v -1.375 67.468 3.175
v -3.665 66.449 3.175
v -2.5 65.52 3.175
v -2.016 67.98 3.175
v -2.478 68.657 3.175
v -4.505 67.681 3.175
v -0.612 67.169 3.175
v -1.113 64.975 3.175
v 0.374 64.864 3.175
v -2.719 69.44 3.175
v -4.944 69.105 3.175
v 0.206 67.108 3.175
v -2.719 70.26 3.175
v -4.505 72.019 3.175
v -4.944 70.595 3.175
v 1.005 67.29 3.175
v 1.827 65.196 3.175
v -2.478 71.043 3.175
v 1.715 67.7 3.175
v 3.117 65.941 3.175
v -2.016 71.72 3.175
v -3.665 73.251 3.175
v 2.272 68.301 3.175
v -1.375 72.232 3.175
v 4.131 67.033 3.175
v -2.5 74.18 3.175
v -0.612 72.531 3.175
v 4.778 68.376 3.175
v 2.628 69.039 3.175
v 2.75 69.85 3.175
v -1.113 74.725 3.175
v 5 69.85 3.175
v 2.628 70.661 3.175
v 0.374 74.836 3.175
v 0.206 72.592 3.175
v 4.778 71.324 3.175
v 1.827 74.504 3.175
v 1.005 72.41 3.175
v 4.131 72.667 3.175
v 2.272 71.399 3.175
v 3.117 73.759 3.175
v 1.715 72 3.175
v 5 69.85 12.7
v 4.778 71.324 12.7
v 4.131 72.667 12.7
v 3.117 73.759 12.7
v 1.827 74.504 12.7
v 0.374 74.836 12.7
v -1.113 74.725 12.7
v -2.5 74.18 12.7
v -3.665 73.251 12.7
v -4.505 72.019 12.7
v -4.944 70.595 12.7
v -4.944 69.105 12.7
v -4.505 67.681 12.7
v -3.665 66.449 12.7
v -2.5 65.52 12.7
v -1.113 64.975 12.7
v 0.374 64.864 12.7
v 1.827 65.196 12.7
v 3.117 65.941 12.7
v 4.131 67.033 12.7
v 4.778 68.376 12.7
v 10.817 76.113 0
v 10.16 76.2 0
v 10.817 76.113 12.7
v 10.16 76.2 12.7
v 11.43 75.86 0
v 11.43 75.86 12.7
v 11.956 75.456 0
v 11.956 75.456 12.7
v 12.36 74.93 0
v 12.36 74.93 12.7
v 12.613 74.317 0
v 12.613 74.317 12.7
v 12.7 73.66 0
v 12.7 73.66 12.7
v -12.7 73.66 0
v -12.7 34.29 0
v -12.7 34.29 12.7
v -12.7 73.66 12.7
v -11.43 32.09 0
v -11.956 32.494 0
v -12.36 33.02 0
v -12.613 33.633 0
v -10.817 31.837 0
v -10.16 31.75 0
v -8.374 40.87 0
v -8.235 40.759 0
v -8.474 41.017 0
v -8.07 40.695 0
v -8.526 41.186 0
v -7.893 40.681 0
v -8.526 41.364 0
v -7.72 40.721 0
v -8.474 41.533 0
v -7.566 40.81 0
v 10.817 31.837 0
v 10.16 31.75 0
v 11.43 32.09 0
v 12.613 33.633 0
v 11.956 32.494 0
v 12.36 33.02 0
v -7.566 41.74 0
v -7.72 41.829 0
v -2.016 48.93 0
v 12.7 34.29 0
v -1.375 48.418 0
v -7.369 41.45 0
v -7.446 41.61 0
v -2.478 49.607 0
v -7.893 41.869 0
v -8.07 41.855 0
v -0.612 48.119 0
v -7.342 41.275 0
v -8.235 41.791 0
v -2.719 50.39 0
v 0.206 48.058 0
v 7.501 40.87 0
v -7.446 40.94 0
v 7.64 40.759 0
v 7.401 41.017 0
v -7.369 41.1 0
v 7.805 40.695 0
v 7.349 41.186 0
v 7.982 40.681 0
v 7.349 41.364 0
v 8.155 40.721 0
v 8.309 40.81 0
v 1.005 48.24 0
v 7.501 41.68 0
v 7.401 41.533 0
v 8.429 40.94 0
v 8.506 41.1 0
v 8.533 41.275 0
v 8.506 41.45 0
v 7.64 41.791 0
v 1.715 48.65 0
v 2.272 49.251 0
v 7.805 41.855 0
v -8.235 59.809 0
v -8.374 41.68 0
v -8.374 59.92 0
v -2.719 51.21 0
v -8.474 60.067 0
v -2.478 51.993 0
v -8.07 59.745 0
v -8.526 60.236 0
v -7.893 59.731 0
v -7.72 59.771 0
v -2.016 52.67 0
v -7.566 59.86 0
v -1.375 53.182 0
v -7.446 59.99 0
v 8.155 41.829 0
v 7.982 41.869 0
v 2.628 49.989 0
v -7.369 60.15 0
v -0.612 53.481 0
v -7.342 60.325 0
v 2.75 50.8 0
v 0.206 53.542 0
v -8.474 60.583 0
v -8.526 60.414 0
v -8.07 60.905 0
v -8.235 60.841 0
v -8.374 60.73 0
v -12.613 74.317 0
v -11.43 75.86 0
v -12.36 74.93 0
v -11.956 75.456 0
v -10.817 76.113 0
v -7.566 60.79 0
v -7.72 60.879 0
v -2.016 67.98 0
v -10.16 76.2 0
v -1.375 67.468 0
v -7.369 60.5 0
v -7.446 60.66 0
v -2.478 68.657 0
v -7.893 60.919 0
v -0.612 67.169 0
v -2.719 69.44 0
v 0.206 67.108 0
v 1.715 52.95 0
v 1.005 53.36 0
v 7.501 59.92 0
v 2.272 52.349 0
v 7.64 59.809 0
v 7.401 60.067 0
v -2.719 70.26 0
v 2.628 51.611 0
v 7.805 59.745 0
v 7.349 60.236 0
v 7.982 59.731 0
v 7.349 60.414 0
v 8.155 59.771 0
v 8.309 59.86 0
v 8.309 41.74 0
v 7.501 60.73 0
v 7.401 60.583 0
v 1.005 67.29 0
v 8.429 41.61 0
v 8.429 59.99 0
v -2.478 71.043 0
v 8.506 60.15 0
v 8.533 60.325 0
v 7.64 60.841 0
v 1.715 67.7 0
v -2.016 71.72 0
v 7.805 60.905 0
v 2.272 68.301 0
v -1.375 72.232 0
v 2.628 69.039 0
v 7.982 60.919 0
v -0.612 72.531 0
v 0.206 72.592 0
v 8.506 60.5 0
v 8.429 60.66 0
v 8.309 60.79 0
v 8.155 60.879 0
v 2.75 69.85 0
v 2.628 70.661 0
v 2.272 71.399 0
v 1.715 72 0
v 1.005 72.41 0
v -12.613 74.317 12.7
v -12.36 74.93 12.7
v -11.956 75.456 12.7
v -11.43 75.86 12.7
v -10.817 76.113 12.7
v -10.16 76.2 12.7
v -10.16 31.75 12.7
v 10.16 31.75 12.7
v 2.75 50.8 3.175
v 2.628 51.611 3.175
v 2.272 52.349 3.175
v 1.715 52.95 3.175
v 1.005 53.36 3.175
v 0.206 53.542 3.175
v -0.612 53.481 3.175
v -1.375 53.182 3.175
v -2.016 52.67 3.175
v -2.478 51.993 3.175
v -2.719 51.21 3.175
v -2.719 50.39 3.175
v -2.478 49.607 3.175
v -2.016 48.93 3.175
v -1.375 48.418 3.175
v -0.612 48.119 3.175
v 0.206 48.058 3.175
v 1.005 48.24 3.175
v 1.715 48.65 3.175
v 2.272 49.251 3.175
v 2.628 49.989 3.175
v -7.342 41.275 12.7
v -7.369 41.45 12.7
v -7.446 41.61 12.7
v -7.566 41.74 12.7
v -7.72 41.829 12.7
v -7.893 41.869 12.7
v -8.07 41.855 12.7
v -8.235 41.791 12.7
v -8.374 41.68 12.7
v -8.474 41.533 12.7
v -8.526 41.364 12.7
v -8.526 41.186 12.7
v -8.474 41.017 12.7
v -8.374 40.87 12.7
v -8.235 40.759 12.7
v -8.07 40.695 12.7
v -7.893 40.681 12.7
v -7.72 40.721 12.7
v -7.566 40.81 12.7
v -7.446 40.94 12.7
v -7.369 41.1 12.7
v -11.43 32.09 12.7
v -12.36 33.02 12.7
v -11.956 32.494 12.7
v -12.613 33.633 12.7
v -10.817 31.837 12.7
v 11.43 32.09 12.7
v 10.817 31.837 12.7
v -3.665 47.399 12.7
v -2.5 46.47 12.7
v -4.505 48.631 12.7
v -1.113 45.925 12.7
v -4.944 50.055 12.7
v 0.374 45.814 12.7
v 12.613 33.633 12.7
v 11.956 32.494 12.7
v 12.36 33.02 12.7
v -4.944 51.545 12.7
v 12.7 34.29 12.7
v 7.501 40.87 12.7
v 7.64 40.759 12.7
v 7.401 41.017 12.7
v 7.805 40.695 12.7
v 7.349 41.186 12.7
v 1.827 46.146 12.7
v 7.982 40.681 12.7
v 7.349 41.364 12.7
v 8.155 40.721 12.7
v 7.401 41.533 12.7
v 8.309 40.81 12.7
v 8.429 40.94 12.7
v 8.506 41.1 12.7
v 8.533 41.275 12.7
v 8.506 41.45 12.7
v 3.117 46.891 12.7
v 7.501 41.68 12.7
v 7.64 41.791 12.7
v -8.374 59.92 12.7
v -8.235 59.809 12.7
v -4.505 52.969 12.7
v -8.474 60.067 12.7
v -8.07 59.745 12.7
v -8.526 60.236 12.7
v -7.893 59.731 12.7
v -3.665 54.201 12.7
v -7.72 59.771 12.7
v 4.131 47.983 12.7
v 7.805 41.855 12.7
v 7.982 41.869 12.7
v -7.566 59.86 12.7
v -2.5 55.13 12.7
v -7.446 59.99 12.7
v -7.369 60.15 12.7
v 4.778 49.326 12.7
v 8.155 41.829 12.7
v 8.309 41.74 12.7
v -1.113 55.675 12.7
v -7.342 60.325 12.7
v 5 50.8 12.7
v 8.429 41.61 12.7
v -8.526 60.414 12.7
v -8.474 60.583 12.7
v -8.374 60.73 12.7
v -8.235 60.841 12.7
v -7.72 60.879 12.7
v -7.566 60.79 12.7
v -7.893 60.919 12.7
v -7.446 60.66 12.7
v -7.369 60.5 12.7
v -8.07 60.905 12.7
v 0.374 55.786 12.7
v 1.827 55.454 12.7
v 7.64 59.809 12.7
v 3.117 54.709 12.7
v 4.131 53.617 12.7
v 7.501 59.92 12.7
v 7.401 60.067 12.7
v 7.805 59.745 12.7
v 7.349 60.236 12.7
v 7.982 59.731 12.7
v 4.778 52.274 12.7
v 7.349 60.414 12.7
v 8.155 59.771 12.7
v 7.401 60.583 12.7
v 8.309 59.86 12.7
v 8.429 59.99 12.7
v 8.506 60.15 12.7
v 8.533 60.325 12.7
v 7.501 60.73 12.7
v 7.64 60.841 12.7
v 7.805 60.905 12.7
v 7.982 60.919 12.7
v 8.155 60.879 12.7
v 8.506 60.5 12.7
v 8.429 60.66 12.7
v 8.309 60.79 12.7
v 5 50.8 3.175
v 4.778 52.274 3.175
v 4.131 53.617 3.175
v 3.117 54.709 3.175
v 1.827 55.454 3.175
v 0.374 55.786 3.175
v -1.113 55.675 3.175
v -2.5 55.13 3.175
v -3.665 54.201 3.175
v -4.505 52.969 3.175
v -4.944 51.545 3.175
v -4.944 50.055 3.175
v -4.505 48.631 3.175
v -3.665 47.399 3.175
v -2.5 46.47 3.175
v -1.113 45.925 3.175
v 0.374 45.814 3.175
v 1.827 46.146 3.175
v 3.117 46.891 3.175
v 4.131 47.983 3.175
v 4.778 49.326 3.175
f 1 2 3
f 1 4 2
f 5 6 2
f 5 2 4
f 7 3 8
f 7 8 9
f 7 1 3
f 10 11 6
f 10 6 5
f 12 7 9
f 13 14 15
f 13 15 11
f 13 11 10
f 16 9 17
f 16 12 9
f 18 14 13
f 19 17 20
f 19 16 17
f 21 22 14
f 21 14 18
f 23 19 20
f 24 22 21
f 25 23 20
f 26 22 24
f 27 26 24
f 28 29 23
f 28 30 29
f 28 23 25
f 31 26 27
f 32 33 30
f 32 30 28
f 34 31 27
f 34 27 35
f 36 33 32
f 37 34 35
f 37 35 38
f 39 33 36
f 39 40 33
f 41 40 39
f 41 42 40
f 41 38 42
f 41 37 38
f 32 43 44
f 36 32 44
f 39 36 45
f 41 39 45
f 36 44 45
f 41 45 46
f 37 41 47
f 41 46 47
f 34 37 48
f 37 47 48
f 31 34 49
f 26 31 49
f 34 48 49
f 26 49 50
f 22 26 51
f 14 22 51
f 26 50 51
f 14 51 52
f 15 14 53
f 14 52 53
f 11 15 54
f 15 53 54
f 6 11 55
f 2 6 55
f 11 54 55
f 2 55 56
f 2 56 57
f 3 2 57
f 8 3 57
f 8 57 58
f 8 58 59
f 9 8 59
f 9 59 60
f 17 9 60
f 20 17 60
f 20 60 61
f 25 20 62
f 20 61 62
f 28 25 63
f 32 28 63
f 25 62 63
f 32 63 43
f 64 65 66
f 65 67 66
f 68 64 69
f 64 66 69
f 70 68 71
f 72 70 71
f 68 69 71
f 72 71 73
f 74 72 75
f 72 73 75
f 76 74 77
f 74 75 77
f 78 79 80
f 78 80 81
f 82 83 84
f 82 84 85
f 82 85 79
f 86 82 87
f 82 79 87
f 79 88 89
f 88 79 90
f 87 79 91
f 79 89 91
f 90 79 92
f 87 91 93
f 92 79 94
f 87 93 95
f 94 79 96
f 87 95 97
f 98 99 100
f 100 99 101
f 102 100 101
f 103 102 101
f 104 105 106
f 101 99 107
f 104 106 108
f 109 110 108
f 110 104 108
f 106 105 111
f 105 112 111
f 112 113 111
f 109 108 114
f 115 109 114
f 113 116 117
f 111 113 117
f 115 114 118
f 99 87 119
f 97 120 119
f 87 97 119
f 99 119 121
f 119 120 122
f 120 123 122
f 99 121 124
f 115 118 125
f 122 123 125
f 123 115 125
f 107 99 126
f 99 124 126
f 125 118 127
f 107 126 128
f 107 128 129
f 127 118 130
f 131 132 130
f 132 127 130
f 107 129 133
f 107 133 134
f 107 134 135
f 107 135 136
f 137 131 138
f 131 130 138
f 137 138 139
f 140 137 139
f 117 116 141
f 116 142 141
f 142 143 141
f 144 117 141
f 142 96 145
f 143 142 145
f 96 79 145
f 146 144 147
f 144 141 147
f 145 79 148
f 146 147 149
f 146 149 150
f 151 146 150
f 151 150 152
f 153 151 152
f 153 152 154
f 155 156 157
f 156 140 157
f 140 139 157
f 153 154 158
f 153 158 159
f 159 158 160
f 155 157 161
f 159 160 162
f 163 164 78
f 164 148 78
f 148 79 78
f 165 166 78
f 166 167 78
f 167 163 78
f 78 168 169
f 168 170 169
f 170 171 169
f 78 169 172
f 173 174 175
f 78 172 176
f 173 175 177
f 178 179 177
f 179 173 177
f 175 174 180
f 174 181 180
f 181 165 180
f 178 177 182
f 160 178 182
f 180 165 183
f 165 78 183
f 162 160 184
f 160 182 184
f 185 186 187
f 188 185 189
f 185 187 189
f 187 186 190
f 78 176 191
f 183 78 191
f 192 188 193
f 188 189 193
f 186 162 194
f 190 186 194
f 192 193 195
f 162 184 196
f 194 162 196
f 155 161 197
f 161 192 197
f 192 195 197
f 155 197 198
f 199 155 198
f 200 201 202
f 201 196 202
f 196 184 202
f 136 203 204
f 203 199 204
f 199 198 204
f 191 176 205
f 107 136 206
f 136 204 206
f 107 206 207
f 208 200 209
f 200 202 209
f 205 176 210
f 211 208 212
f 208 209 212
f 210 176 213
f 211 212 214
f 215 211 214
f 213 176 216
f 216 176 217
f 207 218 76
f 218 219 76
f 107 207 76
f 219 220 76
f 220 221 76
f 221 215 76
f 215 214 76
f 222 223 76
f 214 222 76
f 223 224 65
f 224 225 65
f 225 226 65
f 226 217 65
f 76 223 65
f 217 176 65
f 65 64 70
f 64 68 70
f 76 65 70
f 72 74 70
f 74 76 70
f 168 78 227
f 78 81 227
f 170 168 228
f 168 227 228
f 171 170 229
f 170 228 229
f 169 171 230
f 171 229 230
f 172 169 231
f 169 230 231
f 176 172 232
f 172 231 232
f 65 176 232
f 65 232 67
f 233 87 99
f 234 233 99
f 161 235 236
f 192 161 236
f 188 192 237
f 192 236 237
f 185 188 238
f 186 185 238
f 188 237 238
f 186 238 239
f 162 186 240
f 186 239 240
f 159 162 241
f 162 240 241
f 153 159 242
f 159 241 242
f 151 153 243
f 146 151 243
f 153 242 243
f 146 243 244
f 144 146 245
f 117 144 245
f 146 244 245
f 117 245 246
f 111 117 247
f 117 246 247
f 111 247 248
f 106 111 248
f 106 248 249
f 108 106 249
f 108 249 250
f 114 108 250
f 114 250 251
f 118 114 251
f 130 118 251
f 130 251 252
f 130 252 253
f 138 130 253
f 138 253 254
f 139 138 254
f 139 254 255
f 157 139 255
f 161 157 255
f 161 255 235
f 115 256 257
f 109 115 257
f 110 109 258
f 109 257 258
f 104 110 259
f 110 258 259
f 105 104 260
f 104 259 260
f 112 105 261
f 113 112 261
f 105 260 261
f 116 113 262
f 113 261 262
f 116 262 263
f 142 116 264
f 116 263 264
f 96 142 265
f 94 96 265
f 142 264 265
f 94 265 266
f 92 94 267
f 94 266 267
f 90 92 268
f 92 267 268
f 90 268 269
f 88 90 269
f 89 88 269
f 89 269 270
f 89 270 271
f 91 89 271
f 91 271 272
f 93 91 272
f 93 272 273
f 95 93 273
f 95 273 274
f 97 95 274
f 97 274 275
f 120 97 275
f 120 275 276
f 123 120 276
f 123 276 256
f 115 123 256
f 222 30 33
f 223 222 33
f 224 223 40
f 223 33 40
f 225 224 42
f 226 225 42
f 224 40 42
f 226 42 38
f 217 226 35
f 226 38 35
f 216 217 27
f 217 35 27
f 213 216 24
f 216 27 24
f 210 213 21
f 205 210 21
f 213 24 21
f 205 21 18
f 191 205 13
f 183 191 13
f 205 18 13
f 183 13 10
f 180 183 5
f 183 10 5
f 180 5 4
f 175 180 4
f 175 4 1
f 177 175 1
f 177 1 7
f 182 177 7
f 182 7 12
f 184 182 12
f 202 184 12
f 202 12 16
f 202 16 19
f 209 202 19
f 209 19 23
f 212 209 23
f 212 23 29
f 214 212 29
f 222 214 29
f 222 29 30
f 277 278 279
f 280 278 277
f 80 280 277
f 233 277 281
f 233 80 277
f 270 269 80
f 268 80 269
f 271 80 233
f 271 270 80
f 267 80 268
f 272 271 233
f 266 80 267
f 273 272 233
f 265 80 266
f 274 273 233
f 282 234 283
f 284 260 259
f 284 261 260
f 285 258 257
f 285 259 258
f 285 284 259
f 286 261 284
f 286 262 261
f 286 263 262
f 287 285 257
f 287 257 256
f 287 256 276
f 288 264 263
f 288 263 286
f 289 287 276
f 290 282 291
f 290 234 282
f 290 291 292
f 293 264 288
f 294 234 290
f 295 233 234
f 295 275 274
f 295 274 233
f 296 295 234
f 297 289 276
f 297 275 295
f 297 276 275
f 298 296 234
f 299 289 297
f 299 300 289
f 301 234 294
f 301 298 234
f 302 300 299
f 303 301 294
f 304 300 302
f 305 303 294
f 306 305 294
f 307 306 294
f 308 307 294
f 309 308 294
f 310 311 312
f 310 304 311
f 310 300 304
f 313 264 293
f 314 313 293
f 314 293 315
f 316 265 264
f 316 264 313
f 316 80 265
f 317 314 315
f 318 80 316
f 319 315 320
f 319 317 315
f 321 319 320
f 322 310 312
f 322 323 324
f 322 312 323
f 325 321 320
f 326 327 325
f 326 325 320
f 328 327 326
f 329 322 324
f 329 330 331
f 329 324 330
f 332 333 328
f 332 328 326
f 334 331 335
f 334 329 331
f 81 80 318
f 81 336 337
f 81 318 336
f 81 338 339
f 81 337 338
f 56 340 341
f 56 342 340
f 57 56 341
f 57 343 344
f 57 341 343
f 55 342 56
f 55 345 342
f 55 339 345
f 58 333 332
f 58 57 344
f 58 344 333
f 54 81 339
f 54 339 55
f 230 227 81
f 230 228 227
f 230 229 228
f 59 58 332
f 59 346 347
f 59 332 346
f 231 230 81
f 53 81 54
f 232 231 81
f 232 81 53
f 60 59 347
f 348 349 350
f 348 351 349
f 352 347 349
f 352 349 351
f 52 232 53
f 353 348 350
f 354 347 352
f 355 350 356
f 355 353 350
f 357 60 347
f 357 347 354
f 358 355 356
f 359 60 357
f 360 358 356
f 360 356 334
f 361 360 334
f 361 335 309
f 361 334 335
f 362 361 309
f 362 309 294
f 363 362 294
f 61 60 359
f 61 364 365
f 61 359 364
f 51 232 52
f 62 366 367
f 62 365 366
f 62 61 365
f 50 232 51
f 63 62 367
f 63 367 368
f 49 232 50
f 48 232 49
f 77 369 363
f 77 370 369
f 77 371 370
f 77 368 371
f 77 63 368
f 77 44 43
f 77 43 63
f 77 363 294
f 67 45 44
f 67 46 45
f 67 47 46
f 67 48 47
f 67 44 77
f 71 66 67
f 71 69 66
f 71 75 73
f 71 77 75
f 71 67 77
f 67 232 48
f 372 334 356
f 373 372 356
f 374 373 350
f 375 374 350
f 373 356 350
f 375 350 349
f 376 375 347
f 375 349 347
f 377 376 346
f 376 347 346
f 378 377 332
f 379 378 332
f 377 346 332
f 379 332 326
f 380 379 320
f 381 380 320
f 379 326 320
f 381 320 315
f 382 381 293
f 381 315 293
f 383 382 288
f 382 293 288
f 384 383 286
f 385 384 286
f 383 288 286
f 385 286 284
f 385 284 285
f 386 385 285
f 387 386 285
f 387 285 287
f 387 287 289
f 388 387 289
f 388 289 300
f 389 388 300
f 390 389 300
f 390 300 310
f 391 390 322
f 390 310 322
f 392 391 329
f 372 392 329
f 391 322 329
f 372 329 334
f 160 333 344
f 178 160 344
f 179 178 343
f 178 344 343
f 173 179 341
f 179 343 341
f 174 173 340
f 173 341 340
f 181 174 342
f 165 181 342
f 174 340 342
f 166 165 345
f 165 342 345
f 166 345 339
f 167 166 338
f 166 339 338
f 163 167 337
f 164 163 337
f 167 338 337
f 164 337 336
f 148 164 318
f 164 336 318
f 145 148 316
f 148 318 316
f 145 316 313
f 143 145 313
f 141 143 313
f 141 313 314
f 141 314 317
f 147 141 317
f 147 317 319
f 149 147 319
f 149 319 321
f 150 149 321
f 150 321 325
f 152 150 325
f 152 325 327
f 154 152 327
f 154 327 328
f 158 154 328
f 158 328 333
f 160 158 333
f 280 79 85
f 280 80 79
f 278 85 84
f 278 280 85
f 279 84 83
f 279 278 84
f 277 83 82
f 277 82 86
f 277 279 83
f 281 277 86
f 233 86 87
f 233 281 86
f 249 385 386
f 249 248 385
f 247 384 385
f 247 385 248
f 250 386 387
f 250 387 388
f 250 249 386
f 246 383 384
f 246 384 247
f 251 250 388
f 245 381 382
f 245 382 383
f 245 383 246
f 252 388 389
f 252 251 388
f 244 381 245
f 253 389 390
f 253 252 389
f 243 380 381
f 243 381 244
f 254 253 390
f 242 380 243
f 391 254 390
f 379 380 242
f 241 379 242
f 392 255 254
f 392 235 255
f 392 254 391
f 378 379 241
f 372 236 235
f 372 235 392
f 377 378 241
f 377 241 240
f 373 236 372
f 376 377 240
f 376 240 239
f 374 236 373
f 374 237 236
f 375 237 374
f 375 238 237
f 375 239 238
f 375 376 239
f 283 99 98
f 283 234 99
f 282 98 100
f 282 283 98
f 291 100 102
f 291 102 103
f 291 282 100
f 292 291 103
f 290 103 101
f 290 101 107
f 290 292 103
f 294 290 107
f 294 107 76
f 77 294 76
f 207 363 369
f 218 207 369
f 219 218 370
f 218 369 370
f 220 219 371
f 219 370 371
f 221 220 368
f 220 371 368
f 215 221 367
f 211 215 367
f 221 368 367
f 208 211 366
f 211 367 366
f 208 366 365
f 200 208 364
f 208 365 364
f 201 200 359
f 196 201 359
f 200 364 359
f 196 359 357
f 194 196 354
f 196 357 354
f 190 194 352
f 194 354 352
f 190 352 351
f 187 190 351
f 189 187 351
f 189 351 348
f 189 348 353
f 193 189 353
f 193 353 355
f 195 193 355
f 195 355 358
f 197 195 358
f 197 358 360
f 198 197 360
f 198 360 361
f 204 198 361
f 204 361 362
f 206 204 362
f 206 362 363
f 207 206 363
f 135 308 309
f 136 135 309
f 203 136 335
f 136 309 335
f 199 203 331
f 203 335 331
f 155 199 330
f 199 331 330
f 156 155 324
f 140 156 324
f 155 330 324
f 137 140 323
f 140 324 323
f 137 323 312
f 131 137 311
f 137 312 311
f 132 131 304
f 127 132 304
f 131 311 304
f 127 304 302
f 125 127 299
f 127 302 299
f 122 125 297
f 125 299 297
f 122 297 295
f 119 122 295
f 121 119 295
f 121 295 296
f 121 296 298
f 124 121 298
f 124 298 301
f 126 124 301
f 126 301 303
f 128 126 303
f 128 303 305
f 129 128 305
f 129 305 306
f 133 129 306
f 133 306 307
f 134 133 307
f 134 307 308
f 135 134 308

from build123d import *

# Parameters (mm, degrees)
SKETCH1_W           = 25.4
SKETCH1_H           = 44.45
BOSS_EXTRUDE1_DEPTH = 12.7
SKETCH2_R           = 2.75
CUT_EXTRUDE1_DEPTH  = 13.7
SKETCH3_R           = 5
CUT_EXTRUDE2_DEPTH  = 9.525
SKETCH5_R           = 0.5953125
CUT_EXTRUDE3_DEPTH  = 13.7
FILLET1_R           = 2.54


with BuildPart() as part:
    # Sketch1 → Boss-Extrude1 (new body)
    with BuildSketch(Plane.XY):
        with Locations((0, 53.975)):
            Rectangle(SKETCH1_W, SKETCH1_H)
    extrude(amount=BOSS_EXTRUDE1_DEPTH)

    # Sketch2 → Cut-Extrude1 (cut, through all)
    with BuildSketch(Plane.XY.offset(12.7)):
        with Locations((0, 50.8)):
            Circle(SKETCH2_R)
        with Locations((0, 69.85)):
            Circle(SKETCH2_R)
    extrude(amount=-CUT_EXTRUDE1_DEPTH, mode=Mode.SUBTRACT)

    # Sketch3 → Cut-Extrude2 (cut)
    with BuildSketch(Plane.XY.offset(12.7)):
        with Locations((0, 50.8)):
            Circle(SKETCH3_R)
        with Locations((0, 69.85)):
            Circle(SKETCH3_R)
    extrude(amount=-CUT_EXTRUDE2_DEPTH, mode=Mode.SUBTRACT)

    # Sketch5 → Cut-Extrude3 (cut, through all)
    with BuildSketch(Plane.XY.offset(12.7)):
        with Locations((7.9375, 41.275)):
            Circle(SKETCH5_R)
        with Locations((-7.9375, 41.275)):
            Circle(SKETCH5_R)
        with Locations((-7.9375, 60.325)):
            Circle(SKETCH5_R)
        with Locations((7.9375, 60.325)):
            Circle(SKETCH5_R)
    extrude(amount=-CUT_EXTRUDE3_DEPTH, mode=Mode.SUBTRACT)

    # Fillet1
    fillet1_edges = [part.edges().sort_by_distance(p)[0] for p in [
        (-12.7, 76.2, 6.35),
        (12.7, 76.2, 6.35),
        (12.7, 31.75, 6.35),
        (-12.7, 31.75, 6.35),
    ]]
    fillet(fillet1_edges, radius=FILLET1_R)


solid = part.part
